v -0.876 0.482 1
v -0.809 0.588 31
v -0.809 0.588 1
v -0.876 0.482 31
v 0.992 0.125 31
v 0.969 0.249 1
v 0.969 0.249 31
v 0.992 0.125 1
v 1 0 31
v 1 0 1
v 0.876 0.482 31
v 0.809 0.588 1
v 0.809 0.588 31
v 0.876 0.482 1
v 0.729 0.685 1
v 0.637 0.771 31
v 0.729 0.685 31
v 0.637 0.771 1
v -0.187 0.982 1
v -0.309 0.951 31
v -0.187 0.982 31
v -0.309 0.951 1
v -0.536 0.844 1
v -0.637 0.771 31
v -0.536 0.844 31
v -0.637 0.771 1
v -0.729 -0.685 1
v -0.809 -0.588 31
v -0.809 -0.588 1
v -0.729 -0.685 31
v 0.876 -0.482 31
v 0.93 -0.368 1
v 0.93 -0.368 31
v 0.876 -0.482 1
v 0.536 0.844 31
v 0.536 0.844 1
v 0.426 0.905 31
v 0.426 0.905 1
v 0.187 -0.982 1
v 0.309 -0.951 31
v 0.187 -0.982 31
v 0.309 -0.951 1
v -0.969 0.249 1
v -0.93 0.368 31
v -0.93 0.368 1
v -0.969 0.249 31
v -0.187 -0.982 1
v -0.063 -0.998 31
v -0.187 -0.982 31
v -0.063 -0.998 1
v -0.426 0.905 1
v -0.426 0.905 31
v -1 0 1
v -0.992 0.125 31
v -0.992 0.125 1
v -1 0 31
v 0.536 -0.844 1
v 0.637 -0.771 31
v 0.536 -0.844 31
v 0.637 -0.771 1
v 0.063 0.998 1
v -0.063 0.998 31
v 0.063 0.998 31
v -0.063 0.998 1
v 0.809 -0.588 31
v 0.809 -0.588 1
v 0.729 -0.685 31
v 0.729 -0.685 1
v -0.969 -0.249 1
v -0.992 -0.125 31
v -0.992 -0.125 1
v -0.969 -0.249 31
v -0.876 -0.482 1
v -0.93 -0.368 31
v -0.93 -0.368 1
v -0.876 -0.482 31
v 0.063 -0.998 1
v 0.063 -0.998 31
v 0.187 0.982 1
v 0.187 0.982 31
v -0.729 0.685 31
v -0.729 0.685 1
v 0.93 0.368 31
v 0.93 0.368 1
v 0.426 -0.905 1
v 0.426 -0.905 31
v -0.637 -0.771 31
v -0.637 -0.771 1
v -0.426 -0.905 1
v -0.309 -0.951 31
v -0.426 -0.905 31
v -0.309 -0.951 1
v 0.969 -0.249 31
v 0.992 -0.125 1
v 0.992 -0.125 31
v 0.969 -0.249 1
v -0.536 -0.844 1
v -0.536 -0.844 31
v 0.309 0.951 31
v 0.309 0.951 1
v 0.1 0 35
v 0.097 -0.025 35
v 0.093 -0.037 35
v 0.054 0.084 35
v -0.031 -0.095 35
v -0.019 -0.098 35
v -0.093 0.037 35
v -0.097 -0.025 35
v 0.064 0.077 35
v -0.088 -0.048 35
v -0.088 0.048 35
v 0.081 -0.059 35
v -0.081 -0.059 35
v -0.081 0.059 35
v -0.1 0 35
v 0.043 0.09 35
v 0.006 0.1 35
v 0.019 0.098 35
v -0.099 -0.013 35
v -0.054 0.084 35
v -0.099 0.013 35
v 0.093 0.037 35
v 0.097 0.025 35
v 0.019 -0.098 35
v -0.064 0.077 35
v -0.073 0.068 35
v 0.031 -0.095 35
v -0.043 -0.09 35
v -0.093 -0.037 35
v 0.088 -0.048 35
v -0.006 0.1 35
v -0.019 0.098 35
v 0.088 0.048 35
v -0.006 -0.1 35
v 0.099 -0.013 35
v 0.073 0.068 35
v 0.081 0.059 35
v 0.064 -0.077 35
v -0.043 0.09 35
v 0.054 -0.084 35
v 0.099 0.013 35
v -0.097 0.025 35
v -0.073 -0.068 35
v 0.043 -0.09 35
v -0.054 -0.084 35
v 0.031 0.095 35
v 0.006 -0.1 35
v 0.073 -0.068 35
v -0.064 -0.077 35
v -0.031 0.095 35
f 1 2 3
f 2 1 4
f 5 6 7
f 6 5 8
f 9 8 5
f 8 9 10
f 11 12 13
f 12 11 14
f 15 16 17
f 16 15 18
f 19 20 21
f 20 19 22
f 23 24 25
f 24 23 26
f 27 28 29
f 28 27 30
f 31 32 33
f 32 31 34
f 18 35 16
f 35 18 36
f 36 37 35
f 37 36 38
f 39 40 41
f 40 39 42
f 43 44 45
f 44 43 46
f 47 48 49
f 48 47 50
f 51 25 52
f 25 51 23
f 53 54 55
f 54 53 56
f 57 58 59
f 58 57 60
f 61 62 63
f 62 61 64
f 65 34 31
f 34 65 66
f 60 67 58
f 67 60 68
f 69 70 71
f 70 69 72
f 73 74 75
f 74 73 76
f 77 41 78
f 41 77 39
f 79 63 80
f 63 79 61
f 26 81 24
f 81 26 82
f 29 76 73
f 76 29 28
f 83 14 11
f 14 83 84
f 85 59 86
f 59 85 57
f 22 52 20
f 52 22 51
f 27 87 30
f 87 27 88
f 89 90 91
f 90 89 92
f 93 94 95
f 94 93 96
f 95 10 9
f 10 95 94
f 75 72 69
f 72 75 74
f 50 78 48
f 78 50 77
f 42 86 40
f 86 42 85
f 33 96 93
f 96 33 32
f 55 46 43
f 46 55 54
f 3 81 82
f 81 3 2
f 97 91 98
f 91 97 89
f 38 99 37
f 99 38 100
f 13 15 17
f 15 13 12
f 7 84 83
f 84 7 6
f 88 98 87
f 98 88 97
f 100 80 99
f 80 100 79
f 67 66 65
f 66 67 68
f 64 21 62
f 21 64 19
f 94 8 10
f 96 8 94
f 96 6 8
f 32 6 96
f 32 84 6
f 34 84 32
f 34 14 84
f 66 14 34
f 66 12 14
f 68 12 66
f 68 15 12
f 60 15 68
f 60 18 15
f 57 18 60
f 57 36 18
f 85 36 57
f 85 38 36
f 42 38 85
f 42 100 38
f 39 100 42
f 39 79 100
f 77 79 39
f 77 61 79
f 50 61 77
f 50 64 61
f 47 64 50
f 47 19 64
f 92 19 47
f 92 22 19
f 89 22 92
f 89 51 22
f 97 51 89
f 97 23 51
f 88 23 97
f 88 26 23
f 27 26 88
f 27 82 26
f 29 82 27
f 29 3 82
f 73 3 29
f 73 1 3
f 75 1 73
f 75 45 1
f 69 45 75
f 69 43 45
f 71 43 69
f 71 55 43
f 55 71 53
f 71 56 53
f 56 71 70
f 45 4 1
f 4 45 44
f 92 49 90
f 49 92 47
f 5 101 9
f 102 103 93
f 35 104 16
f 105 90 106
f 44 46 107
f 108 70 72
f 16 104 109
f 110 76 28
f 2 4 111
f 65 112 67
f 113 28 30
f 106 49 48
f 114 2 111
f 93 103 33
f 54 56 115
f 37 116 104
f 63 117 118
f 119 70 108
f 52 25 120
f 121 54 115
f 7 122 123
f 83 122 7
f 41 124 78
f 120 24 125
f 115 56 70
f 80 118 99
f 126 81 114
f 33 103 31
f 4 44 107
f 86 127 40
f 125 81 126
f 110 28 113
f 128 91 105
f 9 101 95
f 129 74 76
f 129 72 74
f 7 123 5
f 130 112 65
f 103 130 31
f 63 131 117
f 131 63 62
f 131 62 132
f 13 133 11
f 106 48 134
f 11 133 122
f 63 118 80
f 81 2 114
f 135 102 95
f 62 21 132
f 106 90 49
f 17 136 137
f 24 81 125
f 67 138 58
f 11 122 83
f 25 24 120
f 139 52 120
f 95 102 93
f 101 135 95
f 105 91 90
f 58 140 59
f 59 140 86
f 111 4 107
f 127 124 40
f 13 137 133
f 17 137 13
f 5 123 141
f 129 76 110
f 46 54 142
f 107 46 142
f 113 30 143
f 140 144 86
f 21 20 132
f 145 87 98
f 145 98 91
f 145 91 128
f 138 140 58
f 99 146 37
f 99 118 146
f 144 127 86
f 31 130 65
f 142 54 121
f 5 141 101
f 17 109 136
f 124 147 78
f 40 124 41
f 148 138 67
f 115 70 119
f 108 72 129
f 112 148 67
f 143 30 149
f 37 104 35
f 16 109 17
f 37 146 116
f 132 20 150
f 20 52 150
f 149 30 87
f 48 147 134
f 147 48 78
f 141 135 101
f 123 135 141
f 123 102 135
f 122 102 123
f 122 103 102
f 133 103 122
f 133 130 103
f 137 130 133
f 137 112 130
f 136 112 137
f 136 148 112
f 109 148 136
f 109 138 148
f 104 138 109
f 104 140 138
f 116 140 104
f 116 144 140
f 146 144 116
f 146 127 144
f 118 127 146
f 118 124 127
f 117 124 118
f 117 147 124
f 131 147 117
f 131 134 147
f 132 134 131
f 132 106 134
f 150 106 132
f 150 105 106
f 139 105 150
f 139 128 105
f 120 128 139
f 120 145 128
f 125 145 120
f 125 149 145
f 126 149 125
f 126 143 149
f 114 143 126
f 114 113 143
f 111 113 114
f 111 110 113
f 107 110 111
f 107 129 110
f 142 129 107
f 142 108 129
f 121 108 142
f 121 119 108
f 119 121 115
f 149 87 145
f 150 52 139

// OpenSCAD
$fn=50;
translate([0,0,1])
cylinder(30,1);
translate([0,0,31])
cylinder(r1=1,r2=.1,h=4);
lowFinPoints = [
[0, 0, 5],     //0
[0,0.5, 1],    //1
[4, 0, 2],     //2
[0, -0.5, 1]]; //3
lowFinFaces = [
[0,1,2],
[0,1,3],
[0,2,3],
[1,2,3]];
midFinPoints = [
[0,0,26], //0
[2,0,22], //1
[2,0,14], //2
[0,0,10], //3
[0,0.5,22], //4
[0,-0.5,22],//5
[0,0.5,14], //6
[0,-0.5,14]];//7
midFinFaces = [
[0,1,5],
[1,2,7,5],
[2,3,7],
[0,4,1],
[4,6,2,1],
[2,6,3],
[0,4,6,3,7,5]
];
//polyhedron(midFinPoints, midFinFaces);
for (i = [0:3]) {
    rotate([0,0,i*90])
    polyhedron(points = lowFinPoints, faces = lowFinFaces);
    rotate([0,0,i*90])
    polyhedron(midFinPoints, midFinFaces);
}
